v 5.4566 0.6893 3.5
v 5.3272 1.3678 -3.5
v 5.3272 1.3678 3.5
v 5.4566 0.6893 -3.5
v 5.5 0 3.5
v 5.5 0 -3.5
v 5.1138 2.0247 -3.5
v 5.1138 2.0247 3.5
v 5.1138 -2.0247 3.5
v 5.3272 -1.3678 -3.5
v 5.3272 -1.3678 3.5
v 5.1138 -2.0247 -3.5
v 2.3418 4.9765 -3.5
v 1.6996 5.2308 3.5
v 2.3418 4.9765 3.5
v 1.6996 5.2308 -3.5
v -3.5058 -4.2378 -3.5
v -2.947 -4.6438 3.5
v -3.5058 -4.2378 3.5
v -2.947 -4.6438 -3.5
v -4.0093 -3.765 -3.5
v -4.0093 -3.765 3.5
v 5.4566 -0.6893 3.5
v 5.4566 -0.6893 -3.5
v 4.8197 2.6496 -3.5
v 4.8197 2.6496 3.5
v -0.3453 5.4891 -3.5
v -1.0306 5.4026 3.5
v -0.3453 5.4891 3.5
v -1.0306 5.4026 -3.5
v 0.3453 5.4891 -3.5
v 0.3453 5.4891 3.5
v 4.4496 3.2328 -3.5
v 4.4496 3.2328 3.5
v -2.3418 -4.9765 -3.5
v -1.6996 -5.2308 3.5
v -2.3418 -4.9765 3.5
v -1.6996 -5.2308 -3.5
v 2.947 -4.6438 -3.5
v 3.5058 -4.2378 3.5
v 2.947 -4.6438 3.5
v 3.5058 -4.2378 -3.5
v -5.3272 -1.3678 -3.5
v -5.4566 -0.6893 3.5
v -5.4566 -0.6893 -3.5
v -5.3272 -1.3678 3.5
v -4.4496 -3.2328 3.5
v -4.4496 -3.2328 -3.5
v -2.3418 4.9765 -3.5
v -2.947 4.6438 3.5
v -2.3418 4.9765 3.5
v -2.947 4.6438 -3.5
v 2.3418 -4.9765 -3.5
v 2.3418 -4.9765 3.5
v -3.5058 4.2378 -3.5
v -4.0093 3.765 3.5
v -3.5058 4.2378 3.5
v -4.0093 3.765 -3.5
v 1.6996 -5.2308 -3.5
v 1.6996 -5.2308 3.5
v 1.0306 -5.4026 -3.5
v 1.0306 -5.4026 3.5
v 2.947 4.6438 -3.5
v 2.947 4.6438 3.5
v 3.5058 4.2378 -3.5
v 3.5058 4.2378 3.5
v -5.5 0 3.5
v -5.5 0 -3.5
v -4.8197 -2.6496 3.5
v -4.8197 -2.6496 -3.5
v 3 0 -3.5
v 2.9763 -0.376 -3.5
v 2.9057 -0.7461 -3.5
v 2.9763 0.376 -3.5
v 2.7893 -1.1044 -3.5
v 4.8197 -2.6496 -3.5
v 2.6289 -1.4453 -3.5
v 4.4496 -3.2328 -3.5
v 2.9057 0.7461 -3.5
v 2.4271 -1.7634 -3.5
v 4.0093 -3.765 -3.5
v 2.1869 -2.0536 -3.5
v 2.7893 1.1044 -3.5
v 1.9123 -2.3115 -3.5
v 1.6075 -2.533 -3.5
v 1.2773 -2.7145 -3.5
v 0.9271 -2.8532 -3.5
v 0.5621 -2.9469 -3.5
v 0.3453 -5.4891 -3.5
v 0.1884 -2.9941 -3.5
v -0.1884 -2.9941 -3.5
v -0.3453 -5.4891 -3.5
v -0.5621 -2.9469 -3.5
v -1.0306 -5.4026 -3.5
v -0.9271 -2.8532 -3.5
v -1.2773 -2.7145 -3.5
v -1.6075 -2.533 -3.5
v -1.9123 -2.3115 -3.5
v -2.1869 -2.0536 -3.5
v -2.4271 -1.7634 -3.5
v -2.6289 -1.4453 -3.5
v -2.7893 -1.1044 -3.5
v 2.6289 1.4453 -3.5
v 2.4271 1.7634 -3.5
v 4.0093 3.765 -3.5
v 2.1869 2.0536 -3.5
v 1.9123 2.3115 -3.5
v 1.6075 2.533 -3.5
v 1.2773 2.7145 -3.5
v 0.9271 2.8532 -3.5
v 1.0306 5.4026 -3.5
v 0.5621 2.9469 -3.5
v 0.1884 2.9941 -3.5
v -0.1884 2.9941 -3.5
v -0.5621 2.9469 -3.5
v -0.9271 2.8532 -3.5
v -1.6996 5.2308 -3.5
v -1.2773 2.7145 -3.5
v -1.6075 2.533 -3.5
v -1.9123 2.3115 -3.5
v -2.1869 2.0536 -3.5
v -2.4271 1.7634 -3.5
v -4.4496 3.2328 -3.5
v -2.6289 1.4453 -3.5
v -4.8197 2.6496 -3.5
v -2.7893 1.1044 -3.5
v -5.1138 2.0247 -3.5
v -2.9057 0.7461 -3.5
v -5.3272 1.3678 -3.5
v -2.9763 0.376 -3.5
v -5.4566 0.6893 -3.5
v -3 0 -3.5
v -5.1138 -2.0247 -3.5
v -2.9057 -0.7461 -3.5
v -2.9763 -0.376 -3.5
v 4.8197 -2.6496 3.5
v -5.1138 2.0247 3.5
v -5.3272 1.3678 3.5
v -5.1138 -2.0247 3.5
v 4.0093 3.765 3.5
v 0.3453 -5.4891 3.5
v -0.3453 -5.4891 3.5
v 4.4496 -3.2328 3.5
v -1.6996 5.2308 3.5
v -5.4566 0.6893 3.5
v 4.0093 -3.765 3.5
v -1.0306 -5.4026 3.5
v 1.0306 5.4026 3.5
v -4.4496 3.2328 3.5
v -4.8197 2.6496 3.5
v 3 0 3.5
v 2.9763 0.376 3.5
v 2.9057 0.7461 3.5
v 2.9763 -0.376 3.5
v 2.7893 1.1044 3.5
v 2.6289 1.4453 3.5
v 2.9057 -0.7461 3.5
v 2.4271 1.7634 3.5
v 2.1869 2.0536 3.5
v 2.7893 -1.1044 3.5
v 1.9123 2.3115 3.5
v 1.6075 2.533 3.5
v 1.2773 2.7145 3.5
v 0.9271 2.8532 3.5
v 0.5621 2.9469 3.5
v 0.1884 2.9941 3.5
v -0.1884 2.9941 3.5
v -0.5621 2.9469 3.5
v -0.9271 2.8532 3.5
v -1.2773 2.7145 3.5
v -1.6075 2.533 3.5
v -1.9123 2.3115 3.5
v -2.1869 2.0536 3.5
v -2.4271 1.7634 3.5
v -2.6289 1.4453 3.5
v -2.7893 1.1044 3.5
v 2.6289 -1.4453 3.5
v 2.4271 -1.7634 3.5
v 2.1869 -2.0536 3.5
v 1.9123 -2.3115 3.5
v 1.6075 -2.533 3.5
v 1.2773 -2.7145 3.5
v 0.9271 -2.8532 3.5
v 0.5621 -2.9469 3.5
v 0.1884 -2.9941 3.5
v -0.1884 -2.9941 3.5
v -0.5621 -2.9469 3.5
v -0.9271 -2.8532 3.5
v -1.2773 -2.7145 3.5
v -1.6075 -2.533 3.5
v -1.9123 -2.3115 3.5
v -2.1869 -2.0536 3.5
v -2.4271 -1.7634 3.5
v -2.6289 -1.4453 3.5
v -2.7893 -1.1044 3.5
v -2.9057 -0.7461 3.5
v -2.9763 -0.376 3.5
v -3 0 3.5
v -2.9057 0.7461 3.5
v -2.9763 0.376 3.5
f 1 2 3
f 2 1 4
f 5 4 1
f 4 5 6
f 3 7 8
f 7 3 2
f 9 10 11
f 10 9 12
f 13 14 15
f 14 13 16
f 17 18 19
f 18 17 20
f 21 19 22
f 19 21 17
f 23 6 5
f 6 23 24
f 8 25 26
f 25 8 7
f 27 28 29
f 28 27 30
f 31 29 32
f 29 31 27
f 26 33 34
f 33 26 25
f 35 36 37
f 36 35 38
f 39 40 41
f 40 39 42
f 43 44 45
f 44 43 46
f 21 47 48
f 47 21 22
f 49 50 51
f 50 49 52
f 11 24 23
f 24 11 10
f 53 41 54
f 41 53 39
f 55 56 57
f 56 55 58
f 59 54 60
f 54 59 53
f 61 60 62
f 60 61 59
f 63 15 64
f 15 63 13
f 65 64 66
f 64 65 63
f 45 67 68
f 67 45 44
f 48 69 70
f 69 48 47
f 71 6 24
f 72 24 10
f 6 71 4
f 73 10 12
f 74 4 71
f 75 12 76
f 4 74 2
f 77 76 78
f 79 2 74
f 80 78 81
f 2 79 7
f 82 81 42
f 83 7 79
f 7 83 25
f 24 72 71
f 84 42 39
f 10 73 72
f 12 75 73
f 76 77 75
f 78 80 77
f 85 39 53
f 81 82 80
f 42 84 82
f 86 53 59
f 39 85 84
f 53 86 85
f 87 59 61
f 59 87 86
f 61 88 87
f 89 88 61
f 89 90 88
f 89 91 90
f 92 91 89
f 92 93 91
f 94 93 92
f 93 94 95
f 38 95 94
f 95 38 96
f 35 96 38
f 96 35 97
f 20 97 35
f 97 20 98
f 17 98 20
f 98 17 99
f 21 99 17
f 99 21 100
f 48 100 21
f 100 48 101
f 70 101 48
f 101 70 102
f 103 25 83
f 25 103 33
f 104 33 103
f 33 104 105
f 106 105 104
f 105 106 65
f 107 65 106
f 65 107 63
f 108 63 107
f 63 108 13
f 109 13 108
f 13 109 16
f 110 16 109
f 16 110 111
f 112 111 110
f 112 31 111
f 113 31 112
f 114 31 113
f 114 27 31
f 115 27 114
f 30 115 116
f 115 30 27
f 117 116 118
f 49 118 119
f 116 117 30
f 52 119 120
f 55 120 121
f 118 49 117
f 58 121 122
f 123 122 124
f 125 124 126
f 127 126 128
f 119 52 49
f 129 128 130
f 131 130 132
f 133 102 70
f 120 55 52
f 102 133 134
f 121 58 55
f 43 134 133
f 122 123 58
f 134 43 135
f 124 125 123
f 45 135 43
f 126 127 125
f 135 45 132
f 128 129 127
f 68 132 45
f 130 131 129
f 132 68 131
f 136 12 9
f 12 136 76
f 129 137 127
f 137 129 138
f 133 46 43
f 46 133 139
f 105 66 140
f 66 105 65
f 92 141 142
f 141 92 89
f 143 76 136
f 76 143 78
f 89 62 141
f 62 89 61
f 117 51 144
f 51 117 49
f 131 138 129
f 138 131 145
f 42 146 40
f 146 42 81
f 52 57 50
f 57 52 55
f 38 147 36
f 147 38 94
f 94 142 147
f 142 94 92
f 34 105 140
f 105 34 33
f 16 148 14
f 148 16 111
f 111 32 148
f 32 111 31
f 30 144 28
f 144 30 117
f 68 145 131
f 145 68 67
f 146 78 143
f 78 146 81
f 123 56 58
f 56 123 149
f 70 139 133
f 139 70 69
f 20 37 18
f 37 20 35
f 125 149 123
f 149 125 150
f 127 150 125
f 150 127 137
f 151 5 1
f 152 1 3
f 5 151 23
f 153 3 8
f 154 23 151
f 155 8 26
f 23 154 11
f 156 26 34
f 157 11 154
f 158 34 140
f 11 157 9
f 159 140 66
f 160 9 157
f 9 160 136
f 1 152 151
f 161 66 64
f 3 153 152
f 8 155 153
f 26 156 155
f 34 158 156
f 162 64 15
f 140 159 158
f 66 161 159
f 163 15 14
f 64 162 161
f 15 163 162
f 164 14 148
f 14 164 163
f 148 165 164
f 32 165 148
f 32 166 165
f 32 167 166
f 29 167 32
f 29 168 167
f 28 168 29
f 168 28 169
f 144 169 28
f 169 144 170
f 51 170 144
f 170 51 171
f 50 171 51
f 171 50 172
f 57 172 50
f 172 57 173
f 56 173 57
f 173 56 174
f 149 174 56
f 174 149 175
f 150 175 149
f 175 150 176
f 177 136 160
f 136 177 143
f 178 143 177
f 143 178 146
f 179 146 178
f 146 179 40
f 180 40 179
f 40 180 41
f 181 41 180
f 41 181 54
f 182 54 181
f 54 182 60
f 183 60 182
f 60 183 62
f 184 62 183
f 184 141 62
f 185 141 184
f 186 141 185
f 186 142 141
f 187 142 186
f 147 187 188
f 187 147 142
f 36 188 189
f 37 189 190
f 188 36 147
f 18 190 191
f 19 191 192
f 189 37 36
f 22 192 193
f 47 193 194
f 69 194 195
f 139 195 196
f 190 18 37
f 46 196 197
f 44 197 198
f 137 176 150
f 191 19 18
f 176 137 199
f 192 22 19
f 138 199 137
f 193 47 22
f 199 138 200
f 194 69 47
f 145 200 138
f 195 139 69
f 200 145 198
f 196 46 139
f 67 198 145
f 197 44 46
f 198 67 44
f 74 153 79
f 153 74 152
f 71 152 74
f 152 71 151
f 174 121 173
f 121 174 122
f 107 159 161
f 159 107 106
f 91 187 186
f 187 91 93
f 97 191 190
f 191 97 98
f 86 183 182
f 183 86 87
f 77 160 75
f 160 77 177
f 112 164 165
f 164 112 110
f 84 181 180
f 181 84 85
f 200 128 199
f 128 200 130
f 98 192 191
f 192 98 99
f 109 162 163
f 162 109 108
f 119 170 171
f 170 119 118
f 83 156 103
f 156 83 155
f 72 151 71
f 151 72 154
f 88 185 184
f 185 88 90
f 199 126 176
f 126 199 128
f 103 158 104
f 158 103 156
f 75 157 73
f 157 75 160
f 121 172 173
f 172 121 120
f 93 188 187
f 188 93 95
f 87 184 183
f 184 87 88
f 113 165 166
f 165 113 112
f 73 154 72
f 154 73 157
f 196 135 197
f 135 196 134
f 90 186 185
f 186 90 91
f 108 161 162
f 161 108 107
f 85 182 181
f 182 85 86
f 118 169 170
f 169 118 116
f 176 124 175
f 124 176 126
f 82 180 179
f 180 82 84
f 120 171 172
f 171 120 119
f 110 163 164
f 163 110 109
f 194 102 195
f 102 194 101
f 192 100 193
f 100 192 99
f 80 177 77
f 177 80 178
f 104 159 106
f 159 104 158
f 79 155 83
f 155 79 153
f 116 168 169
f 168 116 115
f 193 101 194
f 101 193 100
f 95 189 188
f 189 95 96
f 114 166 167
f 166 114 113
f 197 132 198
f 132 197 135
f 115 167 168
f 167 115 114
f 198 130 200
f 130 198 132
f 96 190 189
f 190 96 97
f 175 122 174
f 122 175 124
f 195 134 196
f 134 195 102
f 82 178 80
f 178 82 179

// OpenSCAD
$fn = 50;


difference() {
	union() {
		translate(v = [0, 0, -3.5000000000]) {
			cylinder(h = 7, r = 5.5000000000);
		}
	}
	union() {
		translate(v = [0, 0, -100.0000000000]) {
			cylinder(h = 200, r = 3.0000000000);
		}
	}
}
